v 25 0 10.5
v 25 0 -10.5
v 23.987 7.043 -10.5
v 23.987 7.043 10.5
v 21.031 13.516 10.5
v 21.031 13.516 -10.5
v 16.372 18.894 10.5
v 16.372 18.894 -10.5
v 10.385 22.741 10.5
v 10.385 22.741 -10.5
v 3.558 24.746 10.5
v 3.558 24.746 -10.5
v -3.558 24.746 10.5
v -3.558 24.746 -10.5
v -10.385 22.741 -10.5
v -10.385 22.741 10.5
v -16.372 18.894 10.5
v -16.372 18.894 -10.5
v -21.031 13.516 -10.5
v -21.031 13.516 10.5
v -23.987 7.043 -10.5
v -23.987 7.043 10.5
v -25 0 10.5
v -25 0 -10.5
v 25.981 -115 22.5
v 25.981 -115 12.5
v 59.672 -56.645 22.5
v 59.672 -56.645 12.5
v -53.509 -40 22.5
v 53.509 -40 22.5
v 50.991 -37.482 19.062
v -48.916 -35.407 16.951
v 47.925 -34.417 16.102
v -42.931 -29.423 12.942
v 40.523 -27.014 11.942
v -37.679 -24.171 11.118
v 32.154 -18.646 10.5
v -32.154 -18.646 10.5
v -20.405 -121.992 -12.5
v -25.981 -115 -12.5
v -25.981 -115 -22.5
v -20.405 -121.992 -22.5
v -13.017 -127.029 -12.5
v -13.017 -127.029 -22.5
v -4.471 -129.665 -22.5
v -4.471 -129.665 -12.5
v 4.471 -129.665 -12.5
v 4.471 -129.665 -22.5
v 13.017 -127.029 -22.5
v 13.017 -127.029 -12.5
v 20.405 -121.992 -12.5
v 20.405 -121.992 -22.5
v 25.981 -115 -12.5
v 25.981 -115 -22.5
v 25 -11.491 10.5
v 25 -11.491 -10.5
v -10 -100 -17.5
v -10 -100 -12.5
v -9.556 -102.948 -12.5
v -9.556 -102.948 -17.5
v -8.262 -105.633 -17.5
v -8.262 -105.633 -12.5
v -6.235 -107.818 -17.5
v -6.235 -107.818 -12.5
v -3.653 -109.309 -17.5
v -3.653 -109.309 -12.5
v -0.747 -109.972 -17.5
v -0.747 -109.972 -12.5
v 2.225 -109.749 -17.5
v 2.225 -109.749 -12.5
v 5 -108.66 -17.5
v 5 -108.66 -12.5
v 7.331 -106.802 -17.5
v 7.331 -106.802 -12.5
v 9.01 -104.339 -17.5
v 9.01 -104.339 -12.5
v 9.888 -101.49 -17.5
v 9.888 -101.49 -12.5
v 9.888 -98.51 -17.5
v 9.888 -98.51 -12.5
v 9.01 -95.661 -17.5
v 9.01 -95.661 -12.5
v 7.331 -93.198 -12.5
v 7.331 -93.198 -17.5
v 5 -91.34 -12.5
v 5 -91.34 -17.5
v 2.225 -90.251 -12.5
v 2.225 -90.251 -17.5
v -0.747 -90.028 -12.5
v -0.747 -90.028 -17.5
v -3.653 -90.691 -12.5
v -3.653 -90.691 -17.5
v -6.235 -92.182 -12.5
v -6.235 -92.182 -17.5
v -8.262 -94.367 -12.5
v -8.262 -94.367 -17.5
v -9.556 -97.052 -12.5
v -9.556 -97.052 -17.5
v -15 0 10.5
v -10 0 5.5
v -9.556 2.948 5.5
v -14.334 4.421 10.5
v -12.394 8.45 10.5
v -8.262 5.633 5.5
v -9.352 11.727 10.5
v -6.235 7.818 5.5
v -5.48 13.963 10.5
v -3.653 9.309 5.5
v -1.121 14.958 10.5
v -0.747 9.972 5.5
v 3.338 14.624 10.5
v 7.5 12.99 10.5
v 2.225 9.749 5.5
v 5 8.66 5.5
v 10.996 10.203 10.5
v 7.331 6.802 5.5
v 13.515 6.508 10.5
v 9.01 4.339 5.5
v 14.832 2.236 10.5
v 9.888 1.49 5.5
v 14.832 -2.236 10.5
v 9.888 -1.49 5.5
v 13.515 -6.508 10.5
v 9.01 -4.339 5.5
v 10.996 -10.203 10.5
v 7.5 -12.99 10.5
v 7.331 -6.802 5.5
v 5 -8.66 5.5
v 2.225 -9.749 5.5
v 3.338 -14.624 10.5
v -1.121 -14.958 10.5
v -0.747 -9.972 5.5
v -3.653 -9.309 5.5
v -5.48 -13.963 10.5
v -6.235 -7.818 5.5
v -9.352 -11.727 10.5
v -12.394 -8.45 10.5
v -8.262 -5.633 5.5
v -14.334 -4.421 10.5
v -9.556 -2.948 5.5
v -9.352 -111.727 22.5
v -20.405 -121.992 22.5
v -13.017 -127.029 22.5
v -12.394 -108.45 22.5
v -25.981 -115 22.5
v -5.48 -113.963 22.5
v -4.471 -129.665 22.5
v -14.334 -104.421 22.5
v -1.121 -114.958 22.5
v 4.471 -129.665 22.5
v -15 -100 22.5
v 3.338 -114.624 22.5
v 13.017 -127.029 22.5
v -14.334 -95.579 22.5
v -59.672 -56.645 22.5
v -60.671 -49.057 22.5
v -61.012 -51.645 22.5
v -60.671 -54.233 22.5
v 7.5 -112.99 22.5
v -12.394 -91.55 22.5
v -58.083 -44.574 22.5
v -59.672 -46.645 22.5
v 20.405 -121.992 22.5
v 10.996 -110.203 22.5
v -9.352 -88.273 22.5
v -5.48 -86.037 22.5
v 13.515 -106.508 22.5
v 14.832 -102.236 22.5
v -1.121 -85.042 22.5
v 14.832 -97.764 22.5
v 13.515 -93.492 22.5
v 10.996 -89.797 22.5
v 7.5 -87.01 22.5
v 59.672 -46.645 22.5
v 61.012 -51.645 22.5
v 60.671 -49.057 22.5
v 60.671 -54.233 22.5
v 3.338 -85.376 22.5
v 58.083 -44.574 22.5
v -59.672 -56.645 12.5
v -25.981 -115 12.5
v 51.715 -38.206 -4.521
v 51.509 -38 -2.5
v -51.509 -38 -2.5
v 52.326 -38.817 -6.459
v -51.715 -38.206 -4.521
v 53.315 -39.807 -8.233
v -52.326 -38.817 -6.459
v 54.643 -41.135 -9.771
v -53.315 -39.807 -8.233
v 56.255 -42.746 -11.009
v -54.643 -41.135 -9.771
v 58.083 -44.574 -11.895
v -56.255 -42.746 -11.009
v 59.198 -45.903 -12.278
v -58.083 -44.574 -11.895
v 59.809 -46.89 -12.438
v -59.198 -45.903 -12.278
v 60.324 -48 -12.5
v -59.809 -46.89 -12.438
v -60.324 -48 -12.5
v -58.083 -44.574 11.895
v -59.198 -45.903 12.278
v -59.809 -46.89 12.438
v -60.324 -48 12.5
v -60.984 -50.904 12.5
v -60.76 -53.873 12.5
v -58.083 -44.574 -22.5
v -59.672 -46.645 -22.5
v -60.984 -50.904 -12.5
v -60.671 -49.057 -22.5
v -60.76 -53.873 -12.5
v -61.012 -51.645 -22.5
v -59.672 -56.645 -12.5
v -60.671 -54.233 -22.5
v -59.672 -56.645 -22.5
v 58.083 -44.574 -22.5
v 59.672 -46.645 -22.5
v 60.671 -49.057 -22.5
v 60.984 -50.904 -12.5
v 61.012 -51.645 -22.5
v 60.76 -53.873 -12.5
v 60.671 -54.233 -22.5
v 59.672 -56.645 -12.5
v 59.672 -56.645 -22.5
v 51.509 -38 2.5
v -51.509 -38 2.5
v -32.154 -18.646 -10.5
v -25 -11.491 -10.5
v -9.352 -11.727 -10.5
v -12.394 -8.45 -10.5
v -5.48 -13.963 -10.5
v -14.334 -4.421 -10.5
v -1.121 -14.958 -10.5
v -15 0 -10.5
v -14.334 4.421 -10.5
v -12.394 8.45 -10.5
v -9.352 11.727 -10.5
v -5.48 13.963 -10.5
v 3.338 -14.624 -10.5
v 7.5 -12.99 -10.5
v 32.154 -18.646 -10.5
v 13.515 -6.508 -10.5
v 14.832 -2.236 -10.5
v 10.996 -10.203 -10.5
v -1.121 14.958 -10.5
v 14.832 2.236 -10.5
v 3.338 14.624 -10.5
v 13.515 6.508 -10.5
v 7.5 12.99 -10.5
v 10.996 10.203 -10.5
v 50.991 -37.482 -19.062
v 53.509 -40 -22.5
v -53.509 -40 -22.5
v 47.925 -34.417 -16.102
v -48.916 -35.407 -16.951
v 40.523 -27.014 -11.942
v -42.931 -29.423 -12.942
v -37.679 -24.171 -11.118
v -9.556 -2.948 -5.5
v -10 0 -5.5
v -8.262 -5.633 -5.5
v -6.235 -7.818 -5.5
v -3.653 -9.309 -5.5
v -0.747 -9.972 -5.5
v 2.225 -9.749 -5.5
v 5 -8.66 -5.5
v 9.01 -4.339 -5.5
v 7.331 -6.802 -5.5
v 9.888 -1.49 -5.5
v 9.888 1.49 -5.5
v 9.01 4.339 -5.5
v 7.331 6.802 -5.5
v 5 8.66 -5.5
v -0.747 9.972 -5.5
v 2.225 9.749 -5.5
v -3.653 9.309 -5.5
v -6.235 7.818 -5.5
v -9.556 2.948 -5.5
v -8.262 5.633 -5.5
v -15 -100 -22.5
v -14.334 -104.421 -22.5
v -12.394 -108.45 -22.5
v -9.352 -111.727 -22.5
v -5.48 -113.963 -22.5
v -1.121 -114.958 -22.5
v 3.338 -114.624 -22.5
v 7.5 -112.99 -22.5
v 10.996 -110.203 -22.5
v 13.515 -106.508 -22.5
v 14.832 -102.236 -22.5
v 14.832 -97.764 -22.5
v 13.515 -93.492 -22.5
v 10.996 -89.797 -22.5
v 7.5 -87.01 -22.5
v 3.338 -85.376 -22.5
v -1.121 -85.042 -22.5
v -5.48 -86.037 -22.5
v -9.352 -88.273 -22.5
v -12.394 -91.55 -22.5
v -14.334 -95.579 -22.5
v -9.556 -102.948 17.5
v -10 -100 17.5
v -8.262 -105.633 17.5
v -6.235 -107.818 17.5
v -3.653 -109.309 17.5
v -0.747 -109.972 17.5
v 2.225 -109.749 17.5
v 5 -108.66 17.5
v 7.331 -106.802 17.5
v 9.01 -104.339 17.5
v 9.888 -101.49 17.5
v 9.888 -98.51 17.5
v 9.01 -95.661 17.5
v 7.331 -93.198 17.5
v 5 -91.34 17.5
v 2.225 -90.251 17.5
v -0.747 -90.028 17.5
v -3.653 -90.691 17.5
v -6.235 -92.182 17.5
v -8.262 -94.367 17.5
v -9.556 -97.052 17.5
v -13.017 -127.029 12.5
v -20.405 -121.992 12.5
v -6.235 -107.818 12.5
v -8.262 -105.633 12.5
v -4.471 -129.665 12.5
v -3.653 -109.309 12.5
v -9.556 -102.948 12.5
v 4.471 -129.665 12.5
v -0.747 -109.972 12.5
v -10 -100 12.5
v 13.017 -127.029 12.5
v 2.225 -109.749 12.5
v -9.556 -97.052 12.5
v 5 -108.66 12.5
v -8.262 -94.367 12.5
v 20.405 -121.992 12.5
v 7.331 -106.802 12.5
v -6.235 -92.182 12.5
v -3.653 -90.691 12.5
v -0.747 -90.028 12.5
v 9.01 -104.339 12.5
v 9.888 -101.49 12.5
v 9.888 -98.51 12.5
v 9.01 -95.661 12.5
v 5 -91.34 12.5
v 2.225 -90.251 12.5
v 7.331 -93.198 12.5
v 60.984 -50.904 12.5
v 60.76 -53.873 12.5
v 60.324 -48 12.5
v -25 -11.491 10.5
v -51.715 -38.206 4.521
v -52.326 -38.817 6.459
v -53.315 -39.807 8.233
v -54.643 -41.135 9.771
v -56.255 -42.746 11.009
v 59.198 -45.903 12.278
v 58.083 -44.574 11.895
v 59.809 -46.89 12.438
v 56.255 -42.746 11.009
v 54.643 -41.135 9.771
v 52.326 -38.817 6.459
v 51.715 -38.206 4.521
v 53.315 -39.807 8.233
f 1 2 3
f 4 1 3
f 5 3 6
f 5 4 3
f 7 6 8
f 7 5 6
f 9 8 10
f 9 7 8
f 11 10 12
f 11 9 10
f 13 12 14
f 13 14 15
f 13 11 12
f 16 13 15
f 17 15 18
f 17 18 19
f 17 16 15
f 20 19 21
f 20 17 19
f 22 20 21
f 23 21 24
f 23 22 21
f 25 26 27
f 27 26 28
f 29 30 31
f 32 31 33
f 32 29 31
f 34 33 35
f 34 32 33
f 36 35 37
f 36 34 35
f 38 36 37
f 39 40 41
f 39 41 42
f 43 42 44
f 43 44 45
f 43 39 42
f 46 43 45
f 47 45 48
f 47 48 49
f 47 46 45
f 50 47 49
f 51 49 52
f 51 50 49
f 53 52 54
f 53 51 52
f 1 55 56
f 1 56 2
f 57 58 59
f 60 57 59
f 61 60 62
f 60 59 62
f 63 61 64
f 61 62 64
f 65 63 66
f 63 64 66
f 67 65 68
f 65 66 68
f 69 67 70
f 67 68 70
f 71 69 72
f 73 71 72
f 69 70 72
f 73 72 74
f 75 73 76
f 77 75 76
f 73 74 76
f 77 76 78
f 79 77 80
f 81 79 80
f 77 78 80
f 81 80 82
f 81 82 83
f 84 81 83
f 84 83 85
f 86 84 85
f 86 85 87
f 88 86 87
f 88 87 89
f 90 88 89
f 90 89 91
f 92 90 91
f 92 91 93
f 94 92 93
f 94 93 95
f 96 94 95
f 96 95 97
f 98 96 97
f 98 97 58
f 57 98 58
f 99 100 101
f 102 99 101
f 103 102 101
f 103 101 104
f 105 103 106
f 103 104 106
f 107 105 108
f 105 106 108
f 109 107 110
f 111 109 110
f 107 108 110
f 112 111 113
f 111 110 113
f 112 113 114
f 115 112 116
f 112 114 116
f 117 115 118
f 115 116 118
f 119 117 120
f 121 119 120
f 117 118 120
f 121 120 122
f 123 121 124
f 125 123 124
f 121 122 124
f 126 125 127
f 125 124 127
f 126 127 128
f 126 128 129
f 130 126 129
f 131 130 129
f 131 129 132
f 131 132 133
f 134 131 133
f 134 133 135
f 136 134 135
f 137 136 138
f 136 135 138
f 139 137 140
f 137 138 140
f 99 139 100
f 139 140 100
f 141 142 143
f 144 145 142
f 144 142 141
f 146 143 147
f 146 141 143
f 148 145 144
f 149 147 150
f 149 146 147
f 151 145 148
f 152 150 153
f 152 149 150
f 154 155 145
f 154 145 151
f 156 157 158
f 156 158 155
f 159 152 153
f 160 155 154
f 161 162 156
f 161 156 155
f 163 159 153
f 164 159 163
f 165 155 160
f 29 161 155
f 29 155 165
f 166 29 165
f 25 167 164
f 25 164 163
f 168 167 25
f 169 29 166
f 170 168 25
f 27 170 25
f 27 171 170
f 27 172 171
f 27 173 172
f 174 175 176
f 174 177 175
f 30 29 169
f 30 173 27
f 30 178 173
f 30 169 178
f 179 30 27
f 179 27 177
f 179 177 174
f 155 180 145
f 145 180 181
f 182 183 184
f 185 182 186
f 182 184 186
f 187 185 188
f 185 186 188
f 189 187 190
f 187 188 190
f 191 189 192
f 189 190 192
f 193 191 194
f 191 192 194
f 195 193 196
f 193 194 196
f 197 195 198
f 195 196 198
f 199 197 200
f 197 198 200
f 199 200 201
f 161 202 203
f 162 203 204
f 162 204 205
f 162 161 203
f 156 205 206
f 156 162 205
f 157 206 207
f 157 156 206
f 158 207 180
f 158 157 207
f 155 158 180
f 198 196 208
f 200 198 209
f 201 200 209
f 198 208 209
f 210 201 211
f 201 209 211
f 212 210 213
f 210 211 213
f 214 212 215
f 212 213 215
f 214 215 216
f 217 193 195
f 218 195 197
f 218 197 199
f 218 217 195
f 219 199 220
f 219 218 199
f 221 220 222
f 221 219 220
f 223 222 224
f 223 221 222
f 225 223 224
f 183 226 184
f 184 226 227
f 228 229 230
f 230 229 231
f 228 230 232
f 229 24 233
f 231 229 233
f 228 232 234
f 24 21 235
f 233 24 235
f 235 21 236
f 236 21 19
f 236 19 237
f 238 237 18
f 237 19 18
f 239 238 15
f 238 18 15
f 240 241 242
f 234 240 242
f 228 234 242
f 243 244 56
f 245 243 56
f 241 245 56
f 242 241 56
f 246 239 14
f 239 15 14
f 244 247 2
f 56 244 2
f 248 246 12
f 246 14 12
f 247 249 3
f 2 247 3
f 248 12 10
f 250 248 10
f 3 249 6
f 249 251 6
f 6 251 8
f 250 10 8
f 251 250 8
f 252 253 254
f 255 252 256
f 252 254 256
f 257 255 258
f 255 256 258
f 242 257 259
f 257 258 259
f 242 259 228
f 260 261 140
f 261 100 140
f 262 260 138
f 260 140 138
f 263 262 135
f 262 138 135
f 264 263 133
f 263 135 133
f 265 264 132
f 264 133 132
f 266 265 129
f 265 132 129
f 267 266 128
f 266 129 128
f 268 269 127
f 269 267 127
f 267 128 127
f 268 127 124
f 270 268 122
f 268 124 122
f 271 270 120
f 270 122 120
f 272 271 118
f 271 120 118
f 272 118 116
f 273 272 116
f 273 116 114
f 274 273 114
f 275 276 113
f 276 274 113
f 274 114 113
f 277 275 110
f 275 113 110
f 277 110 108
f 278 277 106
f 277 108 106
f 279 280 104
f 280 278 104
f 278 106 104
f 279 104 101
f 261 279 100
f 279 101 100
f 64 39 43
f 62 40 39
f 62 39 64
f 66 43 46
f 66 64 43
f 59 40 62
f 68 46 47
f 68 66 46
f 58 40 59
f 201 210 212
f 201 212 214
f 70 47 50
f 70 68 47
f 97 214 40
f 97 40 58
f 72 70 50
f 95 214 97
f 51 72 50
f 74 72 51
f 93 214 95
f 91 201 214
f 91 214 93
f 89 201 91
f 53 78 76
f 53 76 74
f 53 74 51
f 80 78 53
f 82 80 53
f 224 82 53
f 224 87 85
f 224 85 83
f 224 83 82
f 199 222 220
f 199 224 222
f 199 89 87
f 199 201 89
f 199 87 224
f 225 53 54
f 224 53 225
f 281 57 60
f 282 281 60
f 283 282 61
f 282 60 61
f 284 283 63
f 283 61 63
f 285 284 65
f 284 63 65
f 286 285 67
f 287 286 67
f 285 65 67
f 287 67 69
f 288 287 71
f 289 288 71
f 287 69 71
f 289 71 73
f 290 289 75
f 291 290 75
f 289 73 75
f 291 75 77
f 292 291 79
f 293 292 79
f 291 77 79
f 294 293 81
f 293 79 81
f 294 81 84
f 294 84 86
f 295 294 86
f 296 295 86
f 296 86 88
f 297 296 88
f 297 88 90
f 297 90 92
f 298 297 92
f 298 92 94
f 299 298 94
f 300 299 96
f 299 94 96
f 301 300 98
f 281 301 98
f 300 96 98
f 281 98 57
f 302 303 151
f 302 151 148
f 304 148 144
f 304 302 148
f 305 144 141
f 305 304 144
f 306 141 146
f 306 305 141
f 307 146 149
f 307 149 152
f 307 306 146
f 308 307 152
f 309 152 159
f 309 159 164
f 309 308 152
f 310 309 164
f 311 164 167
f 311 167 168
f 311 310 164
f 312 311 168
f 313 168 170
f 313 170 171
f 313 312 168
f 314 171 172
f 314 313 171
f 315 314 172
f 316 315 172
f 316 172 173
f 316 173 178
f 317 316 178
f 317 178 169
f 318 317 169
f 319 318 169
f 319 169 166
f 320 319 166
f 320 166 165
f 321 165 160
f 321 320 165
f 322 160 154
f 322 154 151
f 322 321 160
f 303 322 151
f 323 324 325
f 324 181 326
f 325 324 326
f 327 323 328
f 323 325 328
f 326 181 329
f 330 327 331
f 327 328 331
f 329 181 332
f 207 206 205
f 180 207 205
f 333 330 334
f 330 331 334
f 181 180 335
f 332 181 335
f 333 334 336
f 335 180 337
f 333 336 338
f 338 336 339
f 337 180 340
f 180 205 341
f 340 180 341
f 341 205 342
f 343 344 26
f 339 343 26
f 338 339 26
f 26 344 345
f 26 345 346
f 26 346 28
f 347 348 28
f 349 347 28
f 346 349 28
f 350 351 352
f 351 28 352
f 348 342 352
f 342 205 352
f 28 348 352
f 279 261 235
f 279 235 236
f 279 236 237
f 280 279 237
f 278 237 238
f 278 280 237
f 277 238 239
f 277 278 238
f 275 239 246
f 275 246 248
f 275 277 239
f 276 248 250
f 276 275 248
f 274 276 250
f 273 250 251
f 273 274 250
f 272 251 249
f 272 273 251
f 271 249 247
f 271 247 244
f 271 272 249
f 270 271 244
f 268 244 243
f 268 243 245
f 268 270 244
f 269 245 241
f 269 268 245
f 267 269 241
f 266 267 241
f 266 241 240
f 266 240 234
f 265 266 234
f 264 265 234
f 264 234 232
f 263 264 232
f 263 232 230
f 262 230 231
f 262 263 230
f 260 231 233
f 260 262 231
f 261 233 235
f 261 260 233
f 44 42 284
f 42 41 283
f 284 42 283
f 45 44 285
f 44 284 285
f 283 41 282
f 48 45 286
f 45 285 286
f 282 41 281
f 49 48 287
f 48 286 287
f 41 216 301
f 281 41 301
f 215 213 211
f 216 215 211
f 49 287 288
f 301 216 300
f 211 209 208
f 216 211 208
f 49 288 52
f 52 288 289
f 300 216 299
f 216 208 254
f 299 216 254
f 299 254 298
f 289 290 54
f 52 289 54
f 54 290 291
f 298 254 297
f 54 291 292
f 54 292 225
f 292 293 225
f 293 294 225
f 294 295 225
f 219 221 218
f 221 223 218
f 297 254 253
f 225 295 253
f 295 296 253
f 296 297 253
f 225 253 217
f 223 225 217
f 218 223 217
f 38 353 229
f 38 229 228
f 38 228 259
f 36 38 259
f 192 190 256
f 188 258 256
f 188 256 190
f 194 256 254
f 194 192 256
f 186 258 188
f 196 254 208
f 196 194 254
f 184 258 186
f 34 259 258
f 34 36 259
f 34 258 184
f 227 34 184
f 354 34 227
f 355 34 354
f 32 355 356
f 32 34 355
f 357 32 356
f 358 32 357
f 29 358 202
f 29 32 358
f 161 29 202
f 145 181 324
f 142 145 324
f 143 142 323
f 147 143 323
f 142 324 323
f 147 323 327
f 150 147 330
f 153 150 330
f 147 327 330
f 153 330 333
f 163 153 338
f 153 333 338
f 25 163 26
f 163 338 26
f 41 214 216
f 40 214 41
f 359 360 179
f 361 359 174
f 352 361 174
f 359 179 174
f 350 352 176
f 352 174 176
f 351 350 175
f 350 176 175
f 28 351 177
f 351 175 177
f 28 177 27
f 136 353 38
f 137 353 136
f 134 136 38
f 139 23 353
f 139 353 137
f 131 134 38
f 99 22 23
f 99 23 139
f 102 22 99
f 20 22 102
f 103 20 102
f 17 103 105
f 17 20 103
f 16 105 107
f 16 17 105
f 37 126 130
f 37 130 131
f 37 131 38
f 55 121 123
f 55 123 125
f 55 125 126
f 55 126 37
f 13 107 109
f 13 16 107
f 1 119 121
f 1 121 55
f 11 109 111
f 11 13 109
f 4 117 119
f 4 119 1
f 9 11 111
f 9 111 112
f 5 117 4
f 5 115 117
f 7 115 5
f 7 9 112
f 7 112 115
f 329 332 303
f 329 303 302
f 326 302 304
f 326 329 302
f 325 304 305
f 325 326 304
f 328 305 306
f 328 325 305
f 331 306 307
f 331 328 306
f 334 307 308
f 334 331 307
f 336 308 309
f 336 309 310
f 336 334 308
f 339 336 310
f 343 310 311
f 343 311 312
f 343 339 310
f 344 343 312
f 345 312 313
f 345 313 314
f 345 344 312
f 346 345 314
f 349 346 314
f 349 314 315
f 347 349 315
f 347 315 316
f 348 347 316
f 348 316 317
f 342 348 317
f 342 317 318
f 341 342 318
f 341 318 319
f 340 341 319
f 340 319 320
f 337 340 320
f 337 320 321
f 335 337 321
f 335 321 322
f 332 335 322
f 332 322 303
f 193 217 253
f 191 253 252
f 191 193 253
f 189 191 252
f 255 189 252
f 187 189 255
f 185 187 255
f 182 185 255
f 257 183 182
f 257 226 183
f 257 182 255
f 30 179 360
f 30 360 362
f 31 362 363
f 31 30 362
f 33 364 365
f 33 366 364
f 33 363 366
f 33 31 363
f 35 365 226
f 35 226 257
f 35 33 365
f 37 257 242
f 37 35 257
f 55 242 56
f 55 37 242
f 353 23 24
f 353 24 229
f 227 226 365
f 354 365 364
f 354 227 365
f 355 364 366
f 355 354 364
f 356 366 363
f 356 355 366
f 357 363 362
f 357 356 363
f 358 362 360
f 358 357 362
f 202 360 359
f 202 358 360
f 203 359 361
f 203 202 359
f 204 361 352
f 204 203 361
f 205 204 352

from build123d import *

# Parameters (mm, degrees)
SKETCH2_R           = 10
BOSS_EXTRUDE2_DEPTH = 22.5
CUT_EXTRUDE4_START  = -12
CUT_EXTRUDE4_DEPTH  = 12
FILLET7_R           = 25
CUT_EXTRUDE5_DEPTH  = 12.5
FILLET8_R           = 10
FILLET9_R           = 10
CHAMFER5_SIZE       = 5


with BuildPart() as part:
    # Sketch2 → Boss-Extrude2 (new body)
    with BuildSketch(Plane.XY):
        with BuildLine():
            Line((-25, 0), (-25, -11.491470389))
            Line((-25, -11.491470389), (-63.508529611, -50))
            Line((-63.508529611, -50), (-25.980762114, -115))
            ThreePointArc((-25.980762114, -115), (0, -130), (25.980762114, -115))
            Line((25.980762114, -115), (63.508529611, -50))
            Line((63.508529611, -50), (25, -11.491470389))
            Line((25, -11.491470389), (25, 0))
            ThreePointArc((25, 0), (0, 25), (-25, 0))
        make_face()
        with Locations(Location((0, 0, 0), (0, 0, 180))):
            Circle(SKETCH2_R, mode=Mode.SUBTRACT)
        with Locations(Location((0, -100, 0), (0, 0, 180))):
            Circle(SKETCH2_R, mode=Mode.SUBTRACT)
    extrude(amount=BOSS_EXTRUDE2_DEPTH)

    # Sketch7 → Cut-Extrude4 (cut)
    with BuildSketch(Plane.XY.offset(22.5).offset(CUT_EXTRUDE4_START)):
        with BuildLine():
            Line((-25, -11.491470389), (-53.508529611, -40))
            Line((-53.508529611, -40), (53.508529611, -40))
            Line((53.508529611, -40), (25, -11.491470389))
            Line((25, -11.491470389), (25, 0))
            ThreePointArc((25, 0), (0, 25), (-25, 0))
            Line((-25, 0), (-25, -11.491470389))
        make_face()
    extrude(amount=CUT_EXTRUDE4_DEPTH, mode=Mode.SUBTRACT)

    # Fillet7
    # the kernel refuses this fillet: 25 mm, written as the material it adds along each edge
    with BuildSketch(Plane(origin=(-106.893920871, -40, 10.5), x_dir=(0, 1, 0), z_dir=(1, 0, 0))) as fillet7_piece_1_section:
        with BuildLine():
            CenterArc((21.354156504, 25), FILLET7_R, 211.332251498, 58.667748502)
            Line((0, 12), (-0.42708313, 11.74))
            ThreePointArc((-0.42708313, 11.74), (-0.5, 6), (-0.5, 0))
            Line((-0.5, 0), (0, -0.5))
            Line((0, -0.5), (21.354156504, -0.5))
            Line((21.354156504, -0.5), (21.354156504, 0))
        make_face()
    fillet7_piece_1 = extrude(amount=213.787841742, mode=Mode.PRIVATE)
    fillet7_piece_1 = split(fillet7_piece_1, bisect_by=Plane(origin=(-24.314247143, -10.805717532, 13.775046533), z_dir=(0.7071067811865464, -0.7071067811865488, 0)), keep=Keep.TOP, mode=Mode.PRIVATE)
    fillet7_piece_1 = split(fillet7_piece_1, bisect_by=Plane(origin=(24.314247143, -10.805717532, 13.775046533), z_dir=(-0.7071067811865461, -0.7071067811865489, 0)), keep=Keep.TOP, mode=Mode.PRIVATE)
    add(fillet7_piece_1)

    # Sketch8 → Cut-Extrude5 (cut)
    with BuildSketch(Plane(origin=(0, 0, 0), x_dir=(-1, 0, 0), z_dir=(0, 0, -1))):
        with BuildLine():
            Line((-51.508529611, -38), (51.508529611, -38))
            Line((51.508529611, -38), (63.508529611, -50))
            Line((63.508529611, -50), (25.980762114, -115))
            ThreePointArc((25.980762114, -115), (0, -130), (-25.980762114, -115))
            Line((-25.980762114, -115), (-63.508529611, -50))
            Line((-63.508529611, -50), (-51.508529611, -38))
        make_face()
    extrude(amount=-CUT_EXTRUDE5_DEPTH, mode=Mode.SUBTRACT)

    # Fillet8
    fillet8_edges = [part.edges().sort_by_distance(p)[0] for p in [
        (0, -38, 12.5),
    ]]
    fillet(fillet8_edges, radius=FILLET8_R)

    # Fillet9
    fillet9_edges = [part.edges().sort_by_distance(p)[0] for p in [
        (-63.508529611, -50, 17.5),
        (63.508529611, -50, 17.5),
    ]]
    fillet(fillet9_edges, radius=FILLET9_R)

    # Chamfer5
    chamfer5_edges = [part.edges().sort_by_distance(p)[0] for p in [
        (10, -100, 22.5),
        (10, 0, 10.5),
    ]]
    chamfer(chamfer5_edges, length=CHAMFER5_SIZE)

    # Mirror3: part across plane


with BuildPart() as part_1:
    add(part.part)
    add(part.part.mirror(Plane(origin=(0, -100, 0), x_dir=(1, 0, 0), z_dir=(0, 0, 1))))


solid = part_1.part
